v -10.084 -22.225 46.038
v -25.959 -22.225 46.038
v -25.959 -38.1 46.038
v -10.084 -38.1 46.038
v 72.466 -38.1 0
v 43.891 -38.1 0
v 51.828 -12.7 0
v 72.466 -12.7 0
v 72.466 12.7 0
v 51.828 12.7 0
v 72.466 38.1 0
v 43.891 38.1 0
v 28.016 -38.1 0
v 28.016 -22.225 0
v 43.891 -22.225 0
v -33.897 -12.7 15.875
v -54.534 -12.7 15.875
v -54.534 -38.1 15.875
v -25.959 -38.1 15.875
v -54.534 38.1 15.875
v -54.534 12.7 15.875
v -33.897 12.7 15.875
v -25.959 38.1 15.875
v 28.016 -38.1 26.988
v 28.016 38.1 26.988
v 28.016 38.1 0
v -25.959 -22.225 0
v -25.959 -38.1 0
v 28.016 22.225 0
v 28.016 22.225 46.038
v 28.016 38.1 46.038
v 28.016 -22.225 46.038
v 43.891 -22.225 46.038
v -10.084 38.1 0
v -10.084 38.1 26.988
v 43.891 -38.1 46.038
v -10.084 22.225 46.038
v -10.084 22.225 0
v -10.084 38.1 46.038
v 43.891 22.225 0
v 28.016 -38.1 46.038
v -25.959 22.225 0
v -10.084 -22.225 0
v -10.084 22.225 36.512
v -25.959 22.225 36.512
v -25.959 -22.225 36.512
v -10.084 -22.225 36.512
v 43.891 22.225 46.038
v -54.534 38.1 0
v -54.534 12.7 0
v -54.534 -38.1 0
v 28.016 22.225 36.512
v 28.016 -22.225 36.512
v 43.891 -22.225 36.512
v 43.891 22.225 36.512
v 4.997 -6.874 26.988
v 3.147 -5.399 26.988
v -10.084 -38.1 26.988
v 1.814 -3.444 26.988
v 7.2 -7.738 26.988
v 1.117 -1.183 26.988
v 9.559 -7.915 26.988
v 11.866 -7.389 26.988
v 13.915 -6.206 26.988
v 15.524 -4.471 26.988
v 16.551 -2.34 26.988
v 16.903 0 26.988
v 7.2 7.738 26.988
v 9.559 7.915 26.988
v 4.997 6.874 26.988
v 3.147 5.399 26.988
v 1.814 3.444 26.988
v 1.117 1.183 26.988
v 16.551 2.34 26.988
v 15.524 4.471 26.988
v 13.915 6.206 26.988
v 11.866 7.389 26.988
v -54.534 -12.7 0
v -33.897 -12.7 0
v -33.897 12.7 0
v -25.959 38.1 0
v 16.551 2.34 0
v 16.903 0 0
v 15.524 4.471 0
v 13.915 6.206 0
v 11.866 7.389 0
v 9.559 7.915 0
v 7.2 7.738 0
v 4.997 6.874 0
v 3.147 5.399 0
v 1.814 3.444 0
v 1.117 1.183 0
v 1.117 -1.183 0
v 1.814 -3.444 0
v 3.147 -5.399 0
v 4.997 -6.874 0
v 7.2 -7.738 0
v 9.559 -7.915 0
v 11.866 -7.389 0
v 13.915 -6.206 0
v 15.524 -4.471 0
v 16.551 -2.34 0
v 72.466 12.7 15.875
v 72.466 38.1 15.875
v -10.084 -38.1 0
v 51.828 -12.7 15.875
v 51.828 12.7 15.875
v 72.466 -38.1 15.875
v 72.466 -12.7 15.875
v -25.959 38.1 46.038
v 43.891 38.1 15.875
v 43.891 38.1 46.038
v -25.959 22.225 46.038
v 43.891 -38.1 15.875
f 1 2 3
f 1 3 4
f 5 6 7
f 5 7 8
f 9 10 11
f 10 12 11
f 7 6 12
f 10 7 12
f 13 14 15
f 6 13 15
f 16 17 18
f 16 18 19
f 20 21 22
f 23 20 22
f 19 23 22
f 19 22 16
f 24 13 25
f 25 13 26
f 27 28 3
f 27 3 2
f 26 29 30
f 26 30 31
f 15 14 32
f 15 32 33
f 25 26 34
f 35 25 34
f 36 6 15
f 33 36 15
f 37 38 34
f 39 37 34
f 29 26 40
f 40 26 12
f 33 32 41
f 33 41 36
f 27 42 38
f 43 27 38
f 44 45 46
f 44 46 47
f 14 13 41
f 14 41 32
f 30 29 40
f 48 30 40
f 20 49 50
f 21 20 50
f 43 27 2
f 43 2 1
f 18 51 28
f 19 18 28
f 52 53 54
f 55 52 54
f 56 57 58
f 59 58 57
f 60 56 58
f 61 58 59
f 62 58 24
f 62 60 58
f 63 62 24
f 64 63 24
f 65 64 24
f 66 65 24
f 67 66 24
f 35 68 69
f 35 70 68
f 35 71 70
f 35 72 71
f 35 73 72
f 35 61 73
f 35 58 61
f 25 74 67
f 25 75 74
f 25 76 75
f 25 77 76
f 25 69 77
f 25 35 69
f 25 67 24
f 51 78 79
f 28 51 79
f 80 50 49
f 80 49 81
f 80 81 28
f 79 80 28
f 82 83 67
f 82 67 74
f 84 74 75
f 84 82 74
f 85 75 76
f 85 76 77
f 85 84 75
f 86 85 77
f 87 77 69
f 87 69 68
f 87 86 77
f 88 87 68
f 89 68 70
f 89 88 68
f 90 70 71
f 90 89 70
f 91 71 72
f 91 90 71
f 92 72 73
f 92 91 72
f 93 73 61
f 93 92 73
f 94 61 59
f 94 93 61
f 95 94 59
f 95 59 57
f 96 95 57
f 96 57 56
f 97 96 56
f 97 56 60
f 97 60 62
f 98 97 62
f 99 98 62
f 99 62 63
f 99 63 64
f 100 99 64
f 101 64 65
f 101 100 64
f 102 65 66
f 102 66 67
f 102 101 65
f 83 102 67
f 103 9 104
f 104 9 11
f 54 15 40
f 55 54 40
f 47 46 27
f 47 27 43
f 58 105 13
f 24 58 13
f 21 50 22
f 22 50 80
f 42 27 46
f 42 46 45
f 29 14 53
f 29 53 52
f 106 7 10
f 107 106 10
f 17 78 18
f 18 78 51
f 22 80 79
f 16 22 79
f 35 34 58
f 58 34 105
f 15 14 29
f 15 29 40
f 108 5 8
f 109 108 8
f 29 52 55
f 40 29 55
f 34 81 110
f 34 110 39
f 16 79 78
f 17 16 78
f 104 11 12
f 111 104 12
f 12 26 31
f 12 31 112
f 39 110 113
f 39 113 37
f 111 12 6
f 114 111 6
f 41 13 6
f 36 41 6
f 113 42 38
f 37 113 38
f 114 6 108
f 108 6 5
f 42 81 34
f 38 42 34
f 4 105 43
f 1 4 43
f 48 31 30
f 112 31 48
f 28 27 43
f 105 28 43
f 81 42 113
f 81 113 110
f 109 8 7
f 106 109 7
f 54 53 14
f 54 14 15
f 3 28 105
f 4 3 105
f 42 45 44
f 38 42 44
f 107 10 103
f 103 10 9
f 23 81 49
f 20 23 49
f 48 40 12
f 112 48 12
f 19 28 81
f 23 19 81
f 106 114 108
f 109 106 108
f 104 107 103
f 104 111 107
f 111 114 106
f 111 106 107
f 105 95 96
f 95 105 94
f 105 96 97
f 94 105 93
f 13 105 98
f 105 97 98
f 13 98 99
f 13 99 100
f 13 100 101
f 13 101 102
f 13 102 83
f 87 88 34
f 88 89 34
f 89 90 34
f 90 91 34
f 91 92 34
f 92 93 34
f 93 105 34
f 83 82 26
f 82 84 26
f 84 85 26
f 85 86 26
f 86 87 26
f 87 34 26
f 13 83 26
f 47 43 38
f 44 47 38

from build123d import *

# Parameters (mm, degrees)
F1_DEPTH = 31.75
F2_DEPTH = 31.75
F0_W     = 31.75
F0_H     = 31.75
F3_DEPTH = 92.075
F0_H_2   = 88.9
F4_DEPTH = 73.025
F0_R     = 15.875
F5_DEPTH = 53.975
F6_SCALE = 0.5


with BuildPart() as f1:
    # F0 (on Top) → F1 (new body)
    with BuildSketch(Plane.XY):
        Polygon((-51.9184716105, 76.2), (-109.0684716105, 76.2), (-109.0684716105, 25.4), (-67.7934716105, 25.4), (-67.7934716105, -25.4), (-109.0684716105, -25.4), (-109.0684716105, -76.2), (-51.9184716105, -76.2), (-51.9184716105, -44.45), (-51.9184716105, 44.45), align=None)
    extrude(amount=F1_DEPTH)


with BuildPart() as f2:
    # F0 (on Top) → F2 (new body)
    with BuildSketch(Plane.XY):
        Polygon((144.9315283895, 76.2), (87.7815283895, 76.2), (87.7815283895, 44.45), (87.7815283895, -44.45), (87.7815283895, -76.2), (144.9315283895, -76.2), (144.9315283895, -25.4), (103.6565283895, -25.4), (103.6565283895, 25.4), (144.9315283895, 25.4), align=None)
    extrude(amount=F2_DEPTH)


with BuildPart() as f3:
    # F0 (on Top) → F3 (new body)
    with BuildSketch(Plane.XY):
        with Locations((-36.0434716105, -60.325)):
            Rectangle(F0_W, F0_H)
    extrude(amount=F3_DEPTH)


with BuildPart() as f3b:
    # F0 (on Top) → F3, piece 2 (new body)
    with BuildSketch(Plane.XY):
        with Locations((-36.0434716105, 60.325)):
            Rectangle(F0_W, F0_H)
    extrude(amount=F3_DEPTH)


with BuildPart() as f3c:
    # F0 (on Top) → F3, piece 3 (new body)
    with BuildSketch(Plane.XY):
        with Locations((71.9065283895, 60.325)):
            Rectangle(F0_W, F0_H)
    extrude(amount=F3_DEPTH)


with BuildPart() as f3d:
    # F0 (on Top) → F3, piece 4 (new body)
    with BuildSketch(Plane.XY):
        with Locations((71.9065283895, -60.325)):
            Rectangle(F0_W, F0_H)
    extrude(amount=F3_DEPTH)


with BuildPart() as f4:
    # F0 (on Top) → F4 (new body)
    with BuildSketch(Plane.XY):
        with Locations((-36.0434716105, 0)):
            Rectangle(F0_W, F0_H_2)
    extrude(amount=F4_DEPTH)


with BuildPart() as f4b:
    # F0 (on Top) → F4, piece 2 (new body)
    with BuildSketch(Plane.XY):
        with Locations((71.9065283895, 0)):
            Rectangle(F0_W, F0_H_2)
    extrude(amount=F4_DEPTH)


with BuildPart() as f5:
    # F0 (on Top) → F5 (new body)
    with BuildSketch(Plane.XY):
        Polygon((56.0315283895, 76.2), (-20.1684716105, 76.2), (-20.1684716105, 44.45), (-20.1684716105, -44.45), (-20.1684716105, -76.2), (56.0315283895, -76.2), (56.0315283895, -44.45), (56.0315283895, 44.45), align=None)
        with Locations((17.9315283895, 0)):
            Circle(F0_R, mode=Mode.SUBTRACT)
    extrude(amount=F5_DEPTH)


with BuildPart() as f1_1:
    # F6: moved
    add(f1.part.scale(F6_SCALE))


with BuildPart() as f2_1:
    # F6: moved
    add(f2.part.scale(F6_SCALE))


with BuildPart() as f3b_1:
    # F6: moved
    add(f3b.part.scale(F6_SCALE))


with BuildPart() as f3_1:
    # F6: moved
    add(f3.part.scale(F6_SCALE))


with BuildPart() as f3c_1:
    # F6: moved
    add(f3c.part.scale(F6_SCALE))


with BuildPart() as f3d_1:
    # F6: moved
    add(f3d.part.scale(F6_SCALE))


with BuildPart() as f4_1:
    # F6: moved
    add(f4.part.scale(F6_SCALE))


with BuildPart() as f4b_1:
    # F6: moved
    add(f4b.part.scale(F6_SCALE))


with BuildPart() as f5_1:
    # F6: moved
    add(f5.part.scale(F6_SCALE))


solid = Compound([f1_1.part, f2_1.part, f3b_1.part, f3_1.part, f3c_1.part, f3d_1.part, f4_1.part, f4b_1.part, f5_1.part])
